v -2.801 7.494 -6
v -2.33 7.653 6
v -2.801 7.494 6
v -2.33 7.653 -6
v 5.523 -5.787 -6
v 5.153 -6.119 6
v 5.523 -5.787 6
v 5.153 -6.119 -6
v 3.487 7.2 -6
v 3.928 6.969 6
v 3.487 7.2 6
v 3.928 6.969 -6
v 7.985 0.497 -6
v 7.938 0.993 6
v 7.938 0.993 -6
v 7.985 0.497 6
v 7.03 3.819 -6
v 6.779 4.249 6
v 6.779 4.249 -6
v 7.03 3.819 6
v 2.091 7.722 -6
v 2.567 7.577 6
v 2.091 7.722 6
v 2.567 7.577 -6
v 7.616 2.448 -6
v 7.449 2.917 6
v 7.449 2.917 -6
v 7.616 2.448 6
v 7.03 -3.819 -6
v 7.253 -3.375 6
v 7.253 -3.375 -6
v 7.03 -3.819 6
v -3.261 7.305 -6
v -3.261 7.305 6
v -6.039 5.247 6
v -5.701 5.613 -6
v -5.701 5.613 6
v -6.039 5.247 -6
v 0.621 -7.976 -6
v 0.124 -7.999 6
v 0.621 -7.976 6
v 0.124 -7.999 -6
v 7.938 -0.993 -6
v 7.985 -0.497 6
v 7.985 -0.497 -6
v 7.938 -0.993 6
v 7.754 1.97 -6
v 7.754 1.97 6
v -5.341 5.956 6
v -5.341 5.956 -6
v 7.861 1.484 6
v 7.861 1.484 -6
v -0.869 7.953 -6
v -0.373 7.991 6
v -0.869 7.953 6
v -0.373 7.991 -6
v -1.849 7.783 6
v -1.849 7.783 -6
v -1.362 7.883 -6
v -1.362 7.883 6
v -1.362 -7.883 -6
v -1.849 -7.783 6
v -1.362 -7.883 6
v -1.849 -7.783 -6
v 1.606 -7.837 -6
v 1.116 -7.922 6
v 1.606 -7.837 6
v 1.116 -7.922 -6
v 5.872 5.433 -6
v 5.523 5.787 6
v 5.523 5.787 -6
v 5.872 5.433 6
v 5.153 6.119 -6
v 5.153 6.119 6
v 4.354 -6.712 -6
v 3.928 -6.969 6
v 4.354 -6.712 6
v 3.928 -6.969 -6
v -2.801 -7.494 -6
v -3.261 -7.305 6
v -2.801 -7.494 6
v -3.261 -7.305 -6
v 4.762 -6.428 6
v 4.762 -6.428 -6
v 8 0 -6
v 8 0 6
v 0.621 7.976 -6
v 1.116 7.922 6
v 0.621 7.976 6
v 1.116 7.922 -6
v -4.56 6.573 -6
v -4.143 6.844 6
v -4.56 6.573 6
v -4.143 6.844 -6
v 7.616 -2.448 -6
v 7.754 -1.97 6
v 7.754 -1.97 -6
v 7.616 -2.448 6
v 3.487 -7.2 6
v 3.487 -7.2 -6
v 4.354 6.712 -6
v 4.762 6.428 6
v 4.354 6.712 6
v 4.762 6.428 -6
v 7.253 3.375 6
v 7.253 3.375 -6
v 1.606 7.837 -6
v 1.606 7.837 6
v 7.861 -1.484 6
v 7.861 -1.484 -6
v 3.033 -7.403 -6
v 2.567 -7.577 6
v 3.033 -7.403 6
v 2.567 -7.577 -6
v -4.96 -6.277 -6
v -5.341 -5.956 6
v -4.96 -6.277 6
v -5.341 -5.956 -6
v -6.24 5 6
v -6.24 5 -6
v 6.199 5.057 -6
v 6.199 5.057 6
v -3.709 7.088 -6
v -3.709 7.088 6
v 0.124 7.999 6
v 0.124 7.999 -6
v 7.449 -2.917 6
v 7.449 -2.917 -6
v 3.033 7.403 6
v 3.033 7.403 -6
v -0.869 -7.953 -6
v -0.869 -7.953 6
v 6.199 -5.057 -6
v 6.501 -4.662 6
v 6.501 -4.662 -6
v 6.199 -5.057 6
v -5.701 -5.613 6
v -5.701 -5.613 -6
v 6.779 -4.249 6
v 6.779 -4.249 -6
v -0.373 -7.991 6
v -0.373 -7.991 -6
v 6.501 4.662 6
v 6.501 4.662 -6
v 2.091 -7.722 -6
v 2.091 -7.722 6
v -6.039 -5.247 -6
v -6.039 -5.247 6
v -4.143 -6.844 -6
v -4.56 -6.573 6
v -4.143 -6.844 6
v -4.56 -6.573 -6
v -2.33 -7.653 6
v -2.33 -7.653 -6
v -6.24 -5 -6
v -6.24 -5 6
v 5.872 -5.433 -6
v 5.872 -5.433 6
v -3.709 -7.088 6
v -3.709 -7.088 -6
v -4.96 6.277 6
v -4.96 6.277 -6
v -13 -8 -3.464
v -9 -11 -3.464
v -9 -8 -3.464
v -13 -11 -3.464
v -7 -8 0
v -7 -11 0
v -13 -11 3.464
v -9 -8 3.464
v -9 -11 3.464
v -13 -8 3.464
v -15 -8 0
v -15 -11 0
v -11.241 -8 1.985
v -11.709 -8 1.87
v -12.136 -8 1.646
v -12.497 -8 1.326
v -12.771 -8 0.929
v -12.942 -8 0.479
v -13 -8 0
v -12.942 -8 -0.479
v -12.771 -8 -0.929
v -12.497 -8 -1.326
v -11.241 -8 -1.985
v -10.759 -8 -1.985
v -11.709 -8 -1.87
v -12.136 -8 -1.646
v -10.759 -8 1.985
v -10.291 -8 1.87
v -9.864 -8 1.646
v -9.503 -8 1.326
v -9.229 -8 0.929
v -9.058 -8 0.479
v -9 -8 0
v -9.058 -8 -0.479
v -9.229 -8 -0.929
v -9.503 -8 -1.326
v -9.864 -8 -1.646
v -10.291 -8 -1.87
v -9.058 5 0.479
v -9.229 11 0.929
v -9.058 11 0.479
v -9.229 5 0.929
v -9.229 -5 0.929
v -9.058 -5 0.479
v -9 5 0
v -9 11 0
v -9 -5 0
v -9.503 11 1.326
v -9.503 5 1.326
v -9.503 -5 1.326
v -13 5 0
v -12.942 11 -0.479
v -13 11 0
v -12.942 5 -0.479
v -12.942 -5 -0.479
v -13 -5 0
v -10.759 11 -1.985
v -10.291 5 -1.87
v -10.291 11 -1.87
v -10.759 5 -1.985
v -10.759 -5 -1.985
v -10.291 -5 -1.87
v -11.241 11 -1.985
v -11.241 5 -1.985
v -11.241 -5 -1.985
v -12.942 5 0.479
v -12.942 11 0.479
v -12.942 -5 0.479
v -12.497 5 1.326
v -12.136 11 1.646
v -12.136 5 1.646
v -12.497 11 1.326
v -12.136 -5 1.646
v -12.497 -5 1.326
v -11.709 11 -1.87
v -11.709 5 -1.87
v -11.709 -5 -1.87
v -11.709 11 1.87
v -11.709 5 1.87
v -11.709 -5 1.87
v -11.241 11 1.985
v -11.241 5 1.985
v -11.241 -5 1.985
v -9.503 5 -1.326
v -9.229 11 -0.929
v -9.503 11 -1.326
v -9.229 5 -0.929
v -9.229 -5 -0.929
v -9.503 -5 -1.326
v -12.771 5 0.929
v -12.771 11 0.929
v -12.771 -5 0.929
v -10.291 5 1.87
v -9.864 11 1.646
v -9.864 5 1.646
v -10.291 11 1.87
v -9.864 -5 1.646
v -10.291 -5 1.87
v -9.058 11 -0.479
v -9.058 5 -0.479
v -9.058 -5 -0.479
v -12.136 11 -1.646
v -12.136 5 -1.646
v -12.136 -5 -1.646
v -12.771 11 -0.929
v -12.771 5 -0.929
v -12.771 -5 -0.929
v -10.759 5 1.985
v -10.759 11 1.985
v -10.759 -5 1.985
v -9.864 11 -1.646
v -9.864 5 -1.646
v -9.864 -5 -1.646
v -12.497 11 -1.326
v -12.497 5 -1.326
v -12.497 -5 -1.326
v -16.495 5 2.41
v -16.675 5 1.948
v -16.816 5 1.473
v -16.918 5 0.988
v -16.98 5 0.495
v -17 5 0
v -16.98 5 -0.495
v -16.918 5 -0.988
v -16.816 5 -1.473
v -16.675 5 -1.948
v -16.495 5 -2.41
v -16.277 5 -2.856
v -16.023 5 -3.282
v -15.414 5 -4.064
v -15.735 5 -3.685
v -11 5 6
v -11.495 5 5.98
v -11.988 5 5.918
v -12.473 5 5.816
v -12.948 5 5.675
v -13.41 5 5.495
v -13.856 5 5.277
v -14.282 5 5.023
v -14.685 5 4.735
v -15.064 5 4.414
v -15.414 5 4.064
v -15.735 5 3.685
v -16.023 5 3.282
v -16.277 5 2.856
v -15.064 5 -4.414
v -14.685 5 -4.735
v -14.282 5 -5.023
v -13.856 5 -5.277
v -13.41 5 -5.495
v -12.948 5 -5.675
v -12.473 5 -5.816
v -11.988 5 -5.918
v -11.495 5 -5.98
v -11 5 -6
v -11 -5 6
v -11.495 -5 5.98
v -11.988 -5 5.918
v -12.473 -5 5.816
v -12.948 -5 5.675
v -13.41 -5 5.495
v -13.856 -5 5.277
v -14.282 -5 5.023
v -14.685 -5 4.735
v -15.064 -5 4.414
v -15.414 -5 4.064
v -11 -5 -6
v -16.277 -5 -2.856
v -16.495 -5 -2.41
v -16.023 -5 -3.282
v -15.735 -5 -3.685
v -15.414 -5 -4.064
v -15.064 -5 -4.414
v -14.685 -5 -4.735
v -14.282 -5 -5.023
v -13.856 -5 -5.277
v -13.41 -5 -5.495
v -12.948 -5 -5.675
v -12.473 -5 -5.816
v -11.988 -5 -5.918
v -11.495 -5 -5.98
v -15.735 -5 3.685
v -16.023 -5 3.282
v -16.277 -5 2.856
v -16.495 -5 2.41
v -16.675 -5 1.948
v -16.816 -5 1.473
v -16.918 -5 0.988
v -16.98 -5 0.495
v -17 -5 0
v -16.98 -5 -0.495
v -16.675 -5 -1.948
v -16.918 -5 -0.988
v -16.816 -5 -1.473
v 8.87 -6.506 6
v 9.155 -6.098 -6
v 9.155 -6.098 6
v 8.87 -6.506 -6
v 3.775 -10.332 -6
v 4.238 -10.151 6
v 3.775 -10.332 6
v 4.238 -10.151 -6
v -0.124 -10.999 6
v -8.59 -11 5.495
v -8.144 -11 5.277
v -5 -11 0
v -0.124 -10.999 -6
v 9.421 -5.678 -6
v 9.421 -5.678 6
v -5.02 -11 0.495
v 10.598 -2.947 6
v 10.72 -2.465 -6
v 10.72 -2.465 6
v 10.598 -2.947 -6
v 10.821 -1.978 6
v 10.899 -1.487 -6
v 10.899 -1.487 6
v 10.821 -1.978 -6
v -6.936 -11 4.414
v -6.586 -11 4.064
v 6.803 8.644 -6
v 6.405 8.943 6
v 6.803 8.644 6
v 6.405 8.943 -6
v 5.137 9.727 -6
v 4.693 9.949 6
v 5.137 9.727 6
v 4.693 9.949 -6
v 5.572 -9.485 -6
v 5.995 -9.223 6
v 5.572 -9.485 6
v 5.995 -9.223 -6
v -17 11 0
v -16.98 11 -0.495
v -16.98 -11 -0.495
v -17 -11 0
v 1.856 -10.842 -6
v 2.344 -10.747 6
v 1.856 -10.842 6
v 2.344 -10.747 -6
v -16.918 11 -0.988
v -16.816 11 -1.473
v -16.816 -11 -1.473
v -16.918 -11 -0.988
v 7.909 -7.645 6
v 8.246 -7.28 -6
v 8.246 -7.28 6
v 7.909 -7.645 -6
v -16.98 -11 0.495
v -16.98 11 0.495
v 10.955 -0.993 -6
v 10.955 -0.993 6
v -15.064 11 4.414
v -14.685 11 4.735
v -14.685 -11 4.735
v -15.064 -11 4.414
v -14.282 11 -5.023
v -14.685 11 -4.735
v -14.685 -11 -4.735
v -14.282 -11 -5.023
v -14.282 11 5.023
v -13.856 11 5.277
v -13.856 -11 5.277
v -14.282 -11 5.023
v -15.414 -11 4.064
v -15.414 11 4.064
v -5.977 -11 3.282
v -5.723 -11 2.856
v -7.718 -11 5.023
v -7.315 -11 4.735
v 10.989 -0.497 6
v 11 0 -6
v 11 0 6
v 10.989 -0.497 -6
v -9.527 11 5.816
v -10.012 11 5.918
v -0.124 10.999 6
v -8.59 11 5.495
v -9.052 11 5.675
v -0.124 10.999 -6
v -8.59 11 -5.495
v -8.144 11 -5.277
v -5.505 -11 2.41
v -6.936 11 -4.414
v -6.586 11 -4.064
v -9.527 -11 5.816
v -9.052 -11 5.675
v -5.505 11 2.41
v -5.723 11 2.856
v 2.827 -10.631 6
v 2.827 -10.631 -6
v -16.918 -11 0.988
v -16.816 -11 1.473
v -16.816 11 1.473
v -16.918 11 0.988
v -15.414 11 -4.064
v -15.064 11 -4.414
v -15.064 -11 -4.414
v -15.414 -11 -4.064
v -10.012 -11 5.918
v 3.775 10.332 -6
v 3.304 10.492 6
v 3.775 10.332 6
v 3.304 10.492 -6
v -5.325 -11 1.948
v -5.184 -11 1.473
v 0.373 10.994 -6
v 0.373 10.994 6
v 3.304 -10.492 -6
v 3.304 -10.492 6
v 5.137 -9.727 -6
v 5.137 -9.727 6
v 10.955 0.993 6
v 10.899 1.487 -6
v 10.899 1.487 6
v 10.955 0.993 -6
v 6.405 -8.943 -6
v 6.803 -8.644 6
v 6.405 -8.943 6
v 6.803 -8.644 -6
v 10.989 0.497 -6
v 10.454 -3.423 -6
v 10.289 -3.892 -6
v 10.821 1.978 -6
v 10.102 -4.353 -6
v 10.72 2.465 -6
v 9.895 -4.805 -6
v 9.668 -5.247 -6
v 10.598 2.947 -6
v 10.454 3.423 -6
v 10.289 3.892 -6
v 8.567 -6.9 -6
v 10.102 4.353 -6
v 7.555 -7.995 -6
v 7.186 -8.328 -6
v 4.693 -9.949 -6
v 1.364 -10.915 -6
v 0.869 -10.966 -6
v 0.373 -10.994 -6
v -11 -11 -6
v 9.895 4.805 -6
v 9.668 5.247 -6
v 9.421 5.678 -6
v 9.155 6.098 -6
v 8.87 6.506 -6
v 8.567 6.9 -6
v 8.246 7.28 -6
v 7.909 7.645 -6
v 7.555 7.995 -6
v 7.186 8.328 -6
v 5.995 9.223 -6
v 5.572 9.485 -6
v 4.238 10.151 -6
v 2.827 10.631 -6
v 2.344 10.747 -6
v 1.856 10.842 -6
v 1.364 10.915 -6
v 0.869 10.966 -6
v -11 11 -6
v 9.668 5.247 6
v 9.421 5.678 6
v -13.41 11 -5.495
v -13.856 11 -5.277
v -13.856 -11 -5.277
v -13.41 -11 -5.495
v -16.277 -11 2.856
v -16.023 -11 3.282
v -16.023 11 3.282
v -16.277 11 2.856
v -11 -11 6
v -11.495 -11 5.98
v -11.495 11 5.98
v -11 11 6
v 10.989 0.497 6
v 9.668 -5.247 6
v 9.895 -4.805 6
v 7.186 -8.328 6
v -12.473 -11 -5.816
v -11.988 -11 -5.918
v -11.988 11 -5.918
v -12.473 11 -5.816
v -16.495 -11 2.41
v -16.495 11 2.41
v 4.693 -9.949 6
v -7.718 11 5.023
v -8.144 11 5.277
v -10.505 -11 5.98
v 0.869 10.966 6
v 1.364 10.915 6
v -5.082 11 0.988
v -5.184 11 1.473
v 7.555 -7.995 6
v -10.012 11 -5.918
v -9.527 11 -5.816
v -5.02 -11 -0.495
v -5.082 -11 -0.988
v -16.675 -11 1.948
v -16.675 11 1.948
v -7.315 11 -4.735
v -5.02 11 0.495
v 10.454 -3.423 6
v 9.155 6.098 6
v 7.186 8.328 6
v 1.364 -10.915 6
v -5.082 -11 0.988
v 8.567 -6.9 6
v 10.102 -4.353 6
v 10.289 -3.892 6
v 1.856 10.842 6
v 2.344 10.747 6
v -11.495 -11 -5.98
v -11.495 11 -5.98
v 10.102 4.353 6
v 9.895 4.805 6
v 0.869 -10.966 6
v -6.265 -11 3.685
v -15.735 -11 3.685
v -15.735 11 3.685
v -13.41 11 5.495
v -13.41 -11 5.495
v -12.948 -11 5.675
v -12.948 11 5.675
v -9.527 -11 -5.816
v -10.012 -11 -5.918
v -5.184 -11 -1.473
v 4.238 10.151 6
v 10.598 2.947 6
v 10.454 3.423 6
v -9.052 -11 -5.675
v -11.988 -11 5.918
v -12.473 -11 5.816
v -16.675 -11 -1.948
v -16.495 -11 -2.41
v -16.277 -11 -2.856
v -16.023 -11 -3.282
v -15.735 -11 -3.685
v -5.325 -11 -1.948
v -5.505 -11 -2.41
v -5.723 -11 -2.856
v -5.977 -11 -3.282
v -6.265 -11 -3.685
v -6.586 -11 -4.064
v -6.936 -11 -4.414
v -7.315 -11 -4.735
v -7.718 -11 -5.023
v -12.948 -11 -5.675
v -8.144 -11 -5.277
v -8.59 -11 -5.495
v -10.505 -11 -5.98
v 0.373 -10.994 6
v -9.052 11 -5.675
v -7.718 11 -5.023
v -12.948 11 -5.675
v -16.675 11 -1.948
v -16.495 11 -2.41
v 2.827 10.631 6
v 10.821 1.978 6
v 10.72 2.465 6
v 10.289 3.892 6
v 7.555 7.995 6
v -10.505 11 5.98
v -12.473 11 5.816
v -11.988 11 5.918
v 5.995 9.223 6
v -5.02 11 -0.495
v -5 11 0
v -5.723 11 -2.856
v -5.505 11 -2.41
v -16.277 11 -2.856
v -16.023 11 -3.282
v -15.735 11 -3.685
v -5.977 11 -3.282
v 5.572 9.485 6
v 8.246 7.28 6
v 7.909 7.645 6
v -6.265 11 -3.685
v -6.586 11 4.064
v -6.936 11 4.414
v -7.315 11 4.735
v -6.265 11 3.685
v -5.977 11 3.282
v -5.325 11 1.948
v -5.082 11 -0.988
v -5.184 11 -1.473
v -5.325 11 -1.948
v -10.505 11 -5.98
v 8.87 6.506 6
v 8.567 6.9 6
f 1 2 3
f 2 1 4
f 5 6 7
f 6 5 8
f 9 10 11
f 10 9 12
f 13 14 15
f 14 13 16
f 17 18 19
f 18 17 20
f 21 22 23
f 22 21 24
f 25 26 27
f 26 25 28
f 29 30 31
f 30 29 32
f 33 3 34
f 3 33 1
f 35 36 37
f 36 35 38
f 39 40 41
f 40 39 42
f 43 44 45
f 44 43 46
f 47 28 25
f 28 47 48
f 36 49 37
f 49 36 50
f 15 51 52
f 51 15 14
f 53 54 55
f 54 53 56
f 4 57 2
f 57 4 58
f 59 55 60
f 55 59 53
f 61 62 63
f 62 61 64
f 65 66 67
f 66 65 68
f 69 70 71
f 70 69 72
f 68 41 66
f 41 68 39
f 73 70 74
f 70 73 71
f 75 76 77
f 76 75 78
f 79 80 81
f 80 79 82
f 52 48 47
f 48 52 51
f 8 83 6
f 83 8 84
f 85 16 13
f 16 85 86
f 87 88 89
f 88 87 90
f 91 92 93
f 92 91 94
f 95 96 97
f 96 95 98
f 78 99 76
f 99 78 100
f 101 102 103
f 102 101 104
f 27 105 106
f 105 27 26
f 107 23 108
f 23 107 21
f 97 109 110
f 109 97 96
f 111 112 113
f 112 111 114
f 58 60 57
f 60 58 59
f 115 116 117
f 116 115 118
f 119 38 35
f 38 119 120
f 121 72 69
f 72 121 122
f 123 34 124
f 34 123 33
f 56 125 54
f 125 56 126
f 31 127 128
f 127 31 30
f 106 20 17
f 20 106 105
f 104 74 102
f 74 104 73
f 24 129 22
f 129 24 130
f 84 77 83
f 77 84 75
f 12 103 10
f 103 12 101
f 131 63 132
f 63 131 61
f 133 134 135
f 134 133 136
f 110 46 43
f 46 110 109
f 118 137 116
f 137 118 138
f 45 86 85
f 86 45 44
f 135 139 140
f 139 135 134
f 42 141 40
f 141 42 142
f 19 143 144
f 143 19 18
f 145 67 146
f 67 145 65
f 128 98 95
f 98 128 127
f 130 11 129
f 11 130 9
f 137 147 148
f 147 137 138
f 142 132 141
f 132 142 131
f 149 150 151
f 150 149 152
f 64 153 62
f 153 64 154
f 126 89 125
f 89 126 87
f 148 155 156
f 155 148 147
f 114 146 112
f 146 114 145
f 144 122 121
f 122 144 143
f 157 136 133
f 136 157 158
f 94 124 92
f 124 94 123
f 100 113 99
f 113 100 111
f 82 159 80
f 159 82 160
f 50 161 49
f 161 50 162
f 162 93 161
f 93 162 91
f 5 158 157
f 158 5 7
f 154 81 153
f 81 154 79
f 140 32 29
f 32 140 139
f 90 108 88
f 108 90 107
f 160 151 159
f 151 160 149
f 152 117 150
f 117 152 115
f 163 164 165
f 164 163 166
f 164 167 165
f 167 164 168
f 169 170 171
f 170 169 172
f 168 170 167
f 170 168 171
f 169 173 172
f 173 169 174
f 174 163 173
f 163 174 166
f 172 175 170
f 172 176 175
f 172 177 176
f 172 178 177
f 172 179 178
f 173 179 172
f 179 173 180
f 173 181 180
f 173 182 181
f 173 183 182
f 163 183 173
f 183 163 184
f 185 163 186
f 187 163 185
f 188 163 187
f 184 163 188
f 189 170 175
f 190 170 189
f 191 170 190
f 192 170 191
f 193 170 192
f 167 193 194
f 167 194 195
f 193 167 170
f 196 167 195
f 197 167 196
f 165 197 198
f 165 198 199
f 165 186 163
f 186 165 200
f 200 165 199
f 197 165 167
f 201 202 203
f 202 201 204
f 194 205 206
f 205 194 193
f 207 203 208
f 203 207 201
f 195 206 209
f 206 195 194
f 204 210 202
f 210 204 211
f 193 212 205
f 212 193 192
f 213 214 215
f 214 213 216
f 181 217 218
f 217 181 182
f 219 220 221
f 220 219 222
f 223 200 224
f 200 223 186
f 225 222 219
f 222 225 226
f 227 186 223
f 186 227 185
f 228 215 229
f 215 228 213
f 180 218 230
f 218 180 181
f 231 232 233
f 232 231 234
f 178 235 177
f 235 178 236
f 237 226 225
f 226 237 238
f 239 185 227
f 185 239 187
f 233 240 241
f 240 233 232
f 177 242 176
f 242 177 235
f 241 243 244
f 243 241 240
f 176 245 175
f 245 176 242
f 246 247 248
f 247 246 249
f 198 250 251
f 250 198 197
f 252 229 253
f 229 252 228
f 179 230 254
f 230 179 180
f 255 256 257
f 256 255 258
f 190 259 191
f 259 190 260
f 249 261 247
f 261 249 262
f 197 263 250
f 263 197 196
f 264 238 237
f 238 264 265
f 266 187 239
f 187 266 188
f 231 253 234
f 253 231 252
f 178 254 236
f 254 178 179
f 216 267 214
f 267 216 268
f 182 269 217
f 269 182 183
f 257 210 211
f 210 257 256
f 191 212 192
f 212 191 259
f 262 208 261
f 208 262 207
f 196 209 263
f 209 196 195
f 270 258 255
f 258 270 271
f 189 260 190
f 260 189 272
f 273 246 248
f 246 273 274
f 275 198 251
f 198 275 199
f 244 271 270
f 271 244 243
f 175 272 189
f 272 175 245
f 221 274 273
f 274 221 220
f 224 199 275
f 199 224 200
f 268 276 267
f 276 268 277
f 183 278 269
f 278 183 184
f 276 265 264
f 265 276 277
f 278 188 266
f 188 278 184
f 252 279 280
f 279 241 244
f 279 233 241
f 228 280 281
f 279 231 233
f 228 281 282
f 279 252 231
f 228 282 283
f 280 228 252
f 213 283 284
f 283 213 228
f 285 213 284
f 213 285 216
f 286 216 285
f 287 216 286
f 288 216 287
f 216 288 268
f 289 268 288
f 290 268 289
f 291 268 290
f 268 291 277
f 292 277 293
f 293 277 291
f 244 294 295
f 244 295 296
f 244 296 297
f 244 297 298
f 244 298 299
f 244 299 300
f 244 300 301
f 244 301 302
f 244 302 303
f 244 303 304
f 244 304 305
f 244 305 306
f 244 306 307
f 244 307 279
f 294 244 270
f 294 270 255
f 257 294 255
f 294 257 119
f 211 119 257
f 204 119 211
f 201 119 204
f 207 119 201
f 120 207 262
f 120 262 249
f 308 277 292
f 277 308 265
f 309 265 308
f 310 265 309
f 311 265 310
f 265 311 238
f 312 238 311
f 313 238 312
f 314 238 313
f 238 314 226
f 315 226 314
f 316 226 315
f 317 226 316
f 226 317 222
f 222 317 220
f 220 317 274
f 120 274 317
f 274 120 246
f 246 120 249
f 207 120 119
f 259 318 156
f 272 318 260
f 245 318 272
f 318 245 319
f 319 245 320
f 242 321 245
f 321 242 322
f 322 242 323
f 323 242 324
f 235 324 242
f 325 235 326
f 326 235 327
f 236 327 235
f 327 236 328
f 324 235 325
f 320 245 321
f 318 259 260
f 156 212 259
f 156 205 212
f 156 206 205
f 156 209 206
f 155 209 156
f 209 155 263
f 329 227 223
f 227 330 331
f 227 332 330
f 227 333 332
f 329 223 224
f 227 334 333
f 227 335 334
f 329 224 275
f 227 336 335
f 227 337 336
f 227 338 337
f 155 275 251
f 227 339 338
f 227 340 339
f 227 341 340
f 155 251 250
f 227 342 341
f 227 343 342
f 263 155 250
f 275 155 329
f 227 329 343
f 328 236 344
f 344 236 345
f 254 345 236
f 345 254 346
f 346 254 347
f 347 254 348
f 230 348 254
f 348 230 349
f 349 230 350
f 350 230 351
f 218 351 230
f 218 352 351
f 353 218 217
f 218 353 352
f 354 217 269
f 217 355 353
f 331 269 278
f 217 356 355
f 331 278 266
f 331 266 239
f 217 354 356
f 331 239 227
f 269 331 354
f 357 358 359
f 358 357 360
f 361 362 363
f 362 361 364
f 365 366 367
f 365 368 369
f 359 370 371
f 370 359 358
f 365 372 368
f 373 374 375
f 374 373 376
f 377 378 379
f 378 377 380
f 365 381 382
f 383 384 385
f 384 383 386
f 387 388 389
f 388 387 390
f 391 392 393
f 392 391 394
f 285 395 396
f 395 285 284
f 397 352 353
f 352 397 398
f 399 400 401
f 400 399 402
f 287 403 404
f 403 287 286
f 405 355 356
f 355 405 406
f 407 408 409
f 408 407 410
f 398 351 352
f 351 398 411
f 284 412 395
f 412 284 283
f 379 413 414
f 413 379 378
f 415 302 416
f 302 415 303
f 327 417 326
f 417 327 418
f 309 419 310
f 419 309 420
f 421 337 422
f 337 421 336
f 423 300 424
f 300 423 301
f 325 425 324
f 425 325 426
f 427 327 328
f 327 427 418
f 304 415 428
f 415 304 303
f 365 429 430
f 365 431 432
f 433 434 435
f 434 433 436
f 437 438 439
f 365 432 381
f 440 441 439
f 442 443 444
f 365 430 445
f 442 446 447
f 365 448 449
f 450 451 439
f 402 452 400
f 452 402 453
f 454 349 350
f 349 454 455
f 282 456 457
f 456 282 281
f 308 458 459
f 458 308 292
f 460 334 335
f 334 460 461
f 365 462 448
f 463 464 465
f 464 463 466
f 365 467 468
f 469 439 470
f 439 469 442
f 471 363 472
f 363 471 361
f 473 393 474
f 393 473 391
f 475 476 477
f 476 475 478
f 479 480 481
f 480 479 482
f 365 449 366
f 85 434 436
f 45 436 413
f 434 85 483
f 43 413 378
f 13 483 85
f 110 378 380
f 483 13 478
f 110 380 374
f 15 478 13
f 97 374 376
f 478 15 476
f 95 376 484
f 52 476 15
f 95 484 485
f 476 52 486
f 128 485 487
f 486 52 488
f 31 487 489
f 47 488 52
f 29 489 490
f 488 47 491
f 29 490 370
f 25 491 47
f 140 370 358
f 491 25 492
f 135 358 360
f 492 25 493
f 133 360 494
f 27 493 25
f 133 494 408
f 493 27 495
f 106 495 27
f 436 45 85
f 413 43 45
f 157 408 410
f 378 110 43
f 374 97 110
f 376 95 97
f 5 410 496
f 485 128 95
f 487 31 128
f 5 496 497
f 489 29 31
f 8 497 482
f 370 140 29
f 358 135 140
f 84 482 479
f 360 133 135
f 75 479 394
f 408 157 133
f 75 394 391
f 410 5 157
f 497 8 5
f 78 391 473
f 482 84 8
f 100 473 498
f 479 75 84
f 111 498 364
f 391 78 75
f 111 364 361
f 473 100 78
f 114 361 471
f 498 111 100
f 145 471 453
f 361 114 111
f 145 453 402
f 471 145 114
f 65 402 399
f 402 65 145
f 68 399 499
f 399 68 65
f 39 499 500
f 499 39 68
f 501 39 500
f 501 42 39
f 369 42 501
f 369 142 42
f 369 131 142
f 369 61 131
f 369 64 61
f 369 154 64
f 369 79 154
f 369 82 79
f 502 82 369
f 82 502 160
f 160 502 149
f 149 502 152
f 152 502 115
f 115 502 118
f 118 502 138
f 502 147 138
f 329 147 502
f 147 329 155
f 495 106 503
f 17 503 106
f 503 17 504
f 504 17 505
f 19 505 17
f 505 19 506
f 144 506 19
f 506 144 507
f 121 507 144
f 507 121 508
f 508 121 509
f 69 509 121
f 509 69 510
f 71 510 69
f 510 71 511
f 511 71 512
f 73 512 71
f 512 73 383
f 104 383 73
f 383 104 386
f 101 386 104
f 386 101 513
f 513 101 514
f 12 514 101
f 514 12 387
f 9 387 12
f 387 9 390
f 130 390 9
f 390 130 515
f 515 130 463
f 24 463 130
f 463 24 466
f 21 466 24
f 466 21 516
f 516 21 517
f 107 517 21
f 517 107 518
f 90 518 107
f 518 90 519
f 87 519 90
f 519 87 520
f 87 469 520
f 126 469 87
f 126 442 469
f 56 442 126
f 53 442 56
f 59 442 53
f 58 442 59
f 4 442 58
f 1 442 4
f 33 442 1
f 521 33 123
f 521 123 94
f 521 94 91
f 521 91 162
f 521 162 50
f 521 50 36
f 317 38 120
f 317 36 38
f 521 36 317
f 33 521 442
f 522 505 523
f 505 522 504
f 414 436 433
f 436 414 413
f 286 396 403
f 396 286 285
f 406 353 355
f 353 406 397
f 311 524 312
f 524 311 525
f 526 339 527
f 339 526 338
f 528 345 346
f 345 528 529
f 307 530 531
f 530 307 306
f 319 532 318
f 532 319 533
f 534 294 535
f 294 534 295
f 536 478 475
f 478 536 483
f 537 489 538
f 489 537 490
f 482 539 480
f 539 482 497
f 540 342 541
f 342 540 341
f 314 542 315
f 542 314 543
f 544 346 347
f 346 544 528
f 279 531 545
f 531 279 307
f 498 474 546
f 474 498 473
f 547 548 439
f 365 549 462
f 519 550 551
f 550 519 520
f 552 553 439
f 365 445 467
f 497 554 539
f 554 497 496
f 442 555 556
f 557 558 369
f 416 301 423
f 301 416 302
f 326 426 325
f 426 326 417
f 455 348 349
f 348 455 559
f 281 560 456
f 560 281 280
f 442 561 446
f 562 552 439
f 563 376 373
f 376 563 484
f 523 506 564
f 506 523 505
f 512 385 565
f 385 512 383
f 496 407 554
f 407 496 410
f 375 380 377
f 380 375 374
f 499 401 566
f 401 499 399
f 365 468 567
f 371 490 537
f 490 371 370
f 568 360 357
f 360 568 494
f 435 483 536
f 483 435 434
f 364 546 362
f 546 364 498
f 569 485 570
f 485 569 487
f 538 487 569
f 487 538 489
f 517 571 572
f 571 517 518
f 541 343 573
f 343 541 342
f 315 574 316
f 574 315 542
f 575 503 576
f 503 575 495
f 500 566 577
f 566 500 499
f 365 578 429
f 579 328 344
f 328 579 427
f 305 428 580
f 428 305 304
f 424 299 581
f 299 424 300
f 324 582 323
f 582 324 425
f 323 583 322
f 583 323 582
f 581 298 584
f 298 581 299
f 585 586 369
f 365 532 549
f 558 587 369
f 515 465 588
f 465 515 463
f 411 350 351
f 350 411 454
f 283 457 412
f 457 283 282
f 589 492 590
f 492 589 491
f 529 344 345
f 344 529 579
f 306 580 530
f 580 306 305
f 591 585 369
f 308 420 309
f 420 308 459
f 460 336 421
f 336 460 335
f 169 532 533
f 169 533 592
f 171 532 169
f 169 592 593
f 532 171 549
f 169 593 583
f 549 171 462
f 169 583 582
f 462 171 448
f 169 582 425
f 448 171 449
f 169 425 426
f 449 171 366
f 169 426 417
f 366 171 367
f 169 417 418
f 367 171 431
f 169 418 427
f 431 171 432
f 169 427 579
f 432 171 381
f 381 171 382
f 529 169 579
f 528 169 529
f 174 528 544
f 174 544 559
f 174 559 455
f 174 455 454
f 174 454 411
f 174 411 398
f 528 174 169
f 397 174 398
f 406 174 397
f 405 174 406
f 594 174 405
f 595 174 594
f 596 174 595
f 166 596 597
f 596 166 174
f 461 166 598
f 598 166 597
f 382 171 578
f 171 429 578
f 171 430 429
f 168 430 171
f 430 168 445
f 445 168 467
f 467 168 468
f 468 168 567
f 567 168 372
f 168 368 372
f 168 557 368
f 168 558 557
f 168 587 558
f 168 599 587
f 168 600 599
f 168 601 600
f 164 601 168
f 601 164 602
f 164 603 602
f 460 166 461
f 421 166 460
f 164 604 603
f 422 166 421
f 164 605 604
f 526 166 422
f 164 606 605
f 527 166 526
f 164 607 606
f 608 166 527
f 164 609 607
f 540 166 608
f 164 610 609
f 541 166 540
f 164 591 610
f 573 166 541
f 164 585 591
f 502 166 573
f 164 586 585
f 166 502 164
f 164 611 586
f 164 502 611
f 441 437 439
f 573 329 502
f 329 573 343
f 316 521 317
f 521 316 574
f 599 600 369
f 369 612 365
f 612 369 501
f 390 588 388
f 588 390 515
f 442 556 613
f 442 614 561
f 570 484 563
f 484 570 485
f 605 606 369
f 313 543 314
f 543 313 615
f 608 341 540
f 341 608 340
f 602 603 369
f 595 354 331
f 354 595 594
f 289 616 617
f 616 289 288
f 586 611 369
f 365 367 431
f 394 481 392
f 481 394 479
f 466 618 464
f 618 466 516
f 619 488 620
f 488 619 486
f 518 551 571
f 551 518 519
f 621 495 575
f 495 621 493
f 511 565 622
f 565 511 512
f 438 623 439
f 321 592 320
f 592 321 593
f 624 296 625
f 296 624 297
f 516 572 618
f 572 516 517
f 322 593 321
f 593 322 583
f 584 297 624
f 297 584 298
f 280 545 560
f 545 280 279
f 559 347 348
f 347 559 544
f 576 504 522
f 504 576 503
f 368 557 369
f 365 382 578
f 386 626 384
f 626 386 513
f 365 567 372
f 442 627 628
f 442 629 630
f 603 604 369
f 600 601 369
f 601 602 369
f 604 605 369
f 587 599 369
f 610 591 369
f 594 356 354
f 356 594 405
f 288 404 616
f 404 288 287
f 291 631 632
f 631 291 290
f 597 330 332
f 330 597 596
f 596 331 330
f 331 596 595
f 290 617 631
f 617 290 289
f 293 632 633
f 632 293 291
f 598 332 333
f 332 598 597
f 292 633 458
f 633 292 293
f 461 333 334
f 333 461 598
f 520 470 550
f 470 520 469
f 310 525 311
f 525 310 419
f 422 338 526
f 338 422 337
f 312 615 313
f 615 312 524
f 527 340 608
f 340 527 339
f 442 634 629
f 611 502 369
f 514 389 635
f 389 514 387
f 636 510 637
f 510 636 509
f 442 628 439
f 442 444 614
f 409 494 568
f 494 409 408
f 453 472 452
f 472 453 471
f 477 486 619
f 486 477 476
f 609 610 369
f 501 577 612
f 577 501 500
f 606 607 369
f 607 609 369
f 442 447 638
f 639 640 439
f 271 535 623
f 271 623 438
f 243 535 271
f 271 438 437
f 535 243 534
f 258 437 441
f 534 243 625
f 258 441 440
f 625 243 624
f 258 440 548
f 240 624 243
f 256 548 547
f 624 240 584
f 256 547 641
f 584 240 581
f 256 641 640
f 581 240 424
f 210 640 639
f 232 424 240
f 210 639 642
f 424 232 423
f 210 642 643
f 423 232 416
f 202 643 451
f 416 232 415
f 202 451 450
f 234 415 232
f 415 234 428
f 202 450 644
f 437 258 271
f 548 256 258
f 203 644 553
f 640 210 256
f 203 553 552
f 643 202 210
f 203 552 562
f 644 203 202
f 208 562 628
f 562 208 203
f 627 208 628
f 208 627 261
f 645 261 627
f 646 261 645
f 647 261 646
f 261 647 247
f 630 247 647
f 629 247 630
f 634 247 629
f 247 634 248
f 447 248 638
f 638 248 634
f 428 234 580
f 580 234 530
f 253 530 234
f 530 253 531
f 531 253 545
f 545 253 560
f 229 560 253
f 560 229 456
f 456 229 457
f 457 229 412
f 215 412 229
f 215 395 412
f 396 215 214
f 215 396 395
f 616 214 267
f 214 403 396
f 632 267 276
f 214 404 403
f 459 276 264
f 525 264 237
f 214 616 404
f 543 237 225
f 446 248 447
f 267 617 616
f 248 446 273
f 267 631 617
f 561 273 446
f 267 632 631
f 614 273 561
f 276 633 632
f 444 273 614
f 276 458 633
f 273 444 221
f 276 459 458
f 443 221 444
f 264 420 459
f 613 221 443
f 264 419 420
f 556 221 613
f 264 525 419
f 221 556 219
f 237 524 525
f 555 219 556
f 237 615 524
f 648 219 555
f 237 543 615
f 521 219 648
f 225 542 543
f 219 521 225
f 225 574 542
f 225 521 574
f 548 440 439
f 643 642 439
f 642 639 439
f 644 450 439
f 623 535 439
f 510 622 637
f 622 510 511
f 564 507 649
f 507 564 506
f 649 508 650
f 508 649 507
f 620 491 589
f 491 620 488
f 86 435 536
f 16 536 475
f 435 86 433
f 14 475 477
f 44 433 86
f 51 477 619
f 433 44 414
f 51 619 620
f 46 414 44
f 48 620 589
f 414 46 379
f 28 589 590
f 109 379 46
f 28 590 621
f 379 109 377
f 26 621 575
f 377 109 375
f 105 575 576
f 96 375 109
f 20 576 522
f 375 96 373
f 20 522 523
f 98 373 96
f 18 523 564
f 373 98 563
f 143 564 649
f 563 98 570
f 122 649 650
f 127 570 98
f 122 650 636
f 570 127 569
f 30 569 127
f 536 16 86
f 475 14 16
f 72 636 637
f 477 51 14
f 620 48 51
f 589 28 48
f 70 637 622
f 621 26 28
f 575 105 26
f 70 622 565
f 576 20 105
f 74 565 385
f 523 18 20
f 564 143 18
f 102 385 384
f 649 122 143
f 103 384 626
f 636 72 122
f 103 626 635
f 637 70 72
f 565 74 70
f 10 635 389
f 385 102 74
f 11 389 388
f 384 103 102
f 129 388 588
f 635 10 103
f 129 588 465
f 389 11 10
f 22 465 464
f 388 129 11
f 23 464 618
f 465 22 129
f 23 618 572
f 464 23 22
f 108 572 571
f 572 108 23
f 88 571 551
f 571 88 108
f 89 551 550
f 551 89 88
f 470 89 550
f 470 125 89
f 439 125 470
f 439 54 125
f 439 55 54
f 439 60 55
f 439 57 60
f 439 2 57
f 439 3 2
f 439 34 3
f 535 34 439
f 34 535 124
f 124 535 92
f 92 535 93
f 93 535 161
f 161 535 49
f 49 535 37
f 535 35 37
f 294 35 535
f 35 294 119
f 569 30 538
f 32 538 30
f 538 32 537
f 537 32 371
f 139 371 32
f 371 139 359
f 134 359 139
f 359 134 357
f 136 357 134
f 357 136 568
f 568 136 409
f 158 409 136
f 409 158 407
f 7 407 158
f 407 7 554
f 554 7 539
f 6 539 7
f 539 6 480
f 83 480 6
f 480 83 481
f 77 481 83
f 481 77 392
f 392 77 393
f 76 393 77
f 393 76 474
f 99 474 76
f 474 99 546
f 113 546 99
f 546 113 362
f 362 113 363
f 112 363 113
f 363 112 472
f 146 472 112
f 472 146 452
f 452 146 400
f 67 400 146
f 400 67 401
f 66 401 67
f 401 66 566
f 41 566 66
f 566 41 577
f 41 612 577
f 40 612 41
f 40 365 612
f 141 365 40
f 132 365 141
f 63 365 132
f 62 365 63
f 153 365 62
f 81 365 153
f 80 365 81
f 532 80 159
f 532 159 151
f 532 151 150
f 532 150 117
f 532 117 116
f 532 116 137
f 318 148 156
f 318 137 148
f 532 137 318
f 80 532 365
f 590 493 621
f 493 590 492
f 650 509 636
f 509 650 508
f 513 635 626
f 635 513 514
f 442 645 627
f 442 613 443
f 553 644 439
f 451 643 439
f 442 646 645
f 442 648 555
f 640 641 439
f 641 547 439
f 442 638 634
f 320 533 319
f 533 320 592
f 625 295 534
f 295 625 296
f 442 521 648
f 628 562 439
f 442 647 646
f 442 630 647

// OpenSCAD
//Thing to be mounted on round tubes like camera rig rails, stabilizer sledge, tripod legs, etc.
//The idea is to use two of those to connect two tubes either directly or through Hirth Joint
//Such clamp pairs can hold everything rod-mounted to a camera rig: monitor, follow-focus, etc. 
$fa=1/1;
$fs=1/2;
bissl=1/100;
/* [hardware size] */
d_tube=16;
h_ring=12;
d_bolt=4;
d_nut=8;
/* [coupling size] */
coupling=false;
bcd=10;
n_screws=4;
d_circle=2;
/* [general part parameters] */
wall=3;
offset=1;
nut=true;

module clamp_positive(d_tube=16,h_ring=12,wall=3,d_bolt=4,offset=1) {
  hull () {
    translate([0,0,0])cylinder(h=h_ring, d=d_tube+2*wall,center=true);
    translate([-d_bolt/2-offset-d_tube/2,0,0]) rotate([90,0,0]) cylinder(h=d_tube+2*wall, d=h_ring,center=true);
  }
}

module clamp_negative(d_tube=16,h_ring=12,wall=3,d_bolt=4,
                      offset=1,nut=true,d_nut=8,
                      coupling=false,bcd=10,n_screws=4,d_circle=2) {
  cylinder(h=d_tube+2*wall+bissl, d=d_tube,center=true);
  if (nut) translate([-d_bolt/2-offset-d_tube/2,-d_tube/2,0])
    rotate([90,0,0]) cylinder(h=wall+bissl, d=d_nut,$fn=6);
  if (coupling) translate([-d_bolt/2-offset-d_tube/2,d_tube/2+wall,0]) rotate([90,0,0])
    for (i=[180/n_screws:360/n_screws:360]) rotate([0,0,i]) translate([bcd/2,0,-0.01])
      cylinder(h=2*wall+0.02,d=d_circle);
  translate([-d_bolt/2-offset-d_tube/2,0,0]) rotate([90,0,0]) cylinder(h=d_tube+2*wall+bissl, d=d_bolt,center=true);
  translate([-d_bolt/2-h_ring/2-bissl-offset-d_tube/2,-d_tube/2+wall,-h_ring/2-bissl]) 
    cube([d_bolt/2+h_ring/2+d_tube/2+offset,d_tube-2*wall,h_ring+2*bissl]);
}
module clamp(d_tube=16,h_ring=12,wall=3,d_bolt=4,
             offset=1,nut=true,d_nut=8,
             coupling=false,bcd=10,n_screws=4,d_circle=2) {
  difference() {
    clamp_positive(d_tube=d_tube,h_ring=h_ring,wall=wall,d_bolt=d_bolt,offset=offset);
    clamp_negative(d_tube=d_tube,h_ring=h_ring,wall=wall,d_bolt=d_bolt,
             offset=offset,nut=nut,d_nut=d_nut,
             coupling=coupling,bcd=bcd,n_screws=n_screws,d_circle=d_circle);
  }             
}

clamp(d_tube=d_tube,h_ring=h_ring,wall=wall,d_bolt=d_bolt,
             offset=offset,nut=nut,d_nut=d_nut,
             coupling=coupling,bcd=bcd,n_screws=n_screws,d_circle=d_circle);
